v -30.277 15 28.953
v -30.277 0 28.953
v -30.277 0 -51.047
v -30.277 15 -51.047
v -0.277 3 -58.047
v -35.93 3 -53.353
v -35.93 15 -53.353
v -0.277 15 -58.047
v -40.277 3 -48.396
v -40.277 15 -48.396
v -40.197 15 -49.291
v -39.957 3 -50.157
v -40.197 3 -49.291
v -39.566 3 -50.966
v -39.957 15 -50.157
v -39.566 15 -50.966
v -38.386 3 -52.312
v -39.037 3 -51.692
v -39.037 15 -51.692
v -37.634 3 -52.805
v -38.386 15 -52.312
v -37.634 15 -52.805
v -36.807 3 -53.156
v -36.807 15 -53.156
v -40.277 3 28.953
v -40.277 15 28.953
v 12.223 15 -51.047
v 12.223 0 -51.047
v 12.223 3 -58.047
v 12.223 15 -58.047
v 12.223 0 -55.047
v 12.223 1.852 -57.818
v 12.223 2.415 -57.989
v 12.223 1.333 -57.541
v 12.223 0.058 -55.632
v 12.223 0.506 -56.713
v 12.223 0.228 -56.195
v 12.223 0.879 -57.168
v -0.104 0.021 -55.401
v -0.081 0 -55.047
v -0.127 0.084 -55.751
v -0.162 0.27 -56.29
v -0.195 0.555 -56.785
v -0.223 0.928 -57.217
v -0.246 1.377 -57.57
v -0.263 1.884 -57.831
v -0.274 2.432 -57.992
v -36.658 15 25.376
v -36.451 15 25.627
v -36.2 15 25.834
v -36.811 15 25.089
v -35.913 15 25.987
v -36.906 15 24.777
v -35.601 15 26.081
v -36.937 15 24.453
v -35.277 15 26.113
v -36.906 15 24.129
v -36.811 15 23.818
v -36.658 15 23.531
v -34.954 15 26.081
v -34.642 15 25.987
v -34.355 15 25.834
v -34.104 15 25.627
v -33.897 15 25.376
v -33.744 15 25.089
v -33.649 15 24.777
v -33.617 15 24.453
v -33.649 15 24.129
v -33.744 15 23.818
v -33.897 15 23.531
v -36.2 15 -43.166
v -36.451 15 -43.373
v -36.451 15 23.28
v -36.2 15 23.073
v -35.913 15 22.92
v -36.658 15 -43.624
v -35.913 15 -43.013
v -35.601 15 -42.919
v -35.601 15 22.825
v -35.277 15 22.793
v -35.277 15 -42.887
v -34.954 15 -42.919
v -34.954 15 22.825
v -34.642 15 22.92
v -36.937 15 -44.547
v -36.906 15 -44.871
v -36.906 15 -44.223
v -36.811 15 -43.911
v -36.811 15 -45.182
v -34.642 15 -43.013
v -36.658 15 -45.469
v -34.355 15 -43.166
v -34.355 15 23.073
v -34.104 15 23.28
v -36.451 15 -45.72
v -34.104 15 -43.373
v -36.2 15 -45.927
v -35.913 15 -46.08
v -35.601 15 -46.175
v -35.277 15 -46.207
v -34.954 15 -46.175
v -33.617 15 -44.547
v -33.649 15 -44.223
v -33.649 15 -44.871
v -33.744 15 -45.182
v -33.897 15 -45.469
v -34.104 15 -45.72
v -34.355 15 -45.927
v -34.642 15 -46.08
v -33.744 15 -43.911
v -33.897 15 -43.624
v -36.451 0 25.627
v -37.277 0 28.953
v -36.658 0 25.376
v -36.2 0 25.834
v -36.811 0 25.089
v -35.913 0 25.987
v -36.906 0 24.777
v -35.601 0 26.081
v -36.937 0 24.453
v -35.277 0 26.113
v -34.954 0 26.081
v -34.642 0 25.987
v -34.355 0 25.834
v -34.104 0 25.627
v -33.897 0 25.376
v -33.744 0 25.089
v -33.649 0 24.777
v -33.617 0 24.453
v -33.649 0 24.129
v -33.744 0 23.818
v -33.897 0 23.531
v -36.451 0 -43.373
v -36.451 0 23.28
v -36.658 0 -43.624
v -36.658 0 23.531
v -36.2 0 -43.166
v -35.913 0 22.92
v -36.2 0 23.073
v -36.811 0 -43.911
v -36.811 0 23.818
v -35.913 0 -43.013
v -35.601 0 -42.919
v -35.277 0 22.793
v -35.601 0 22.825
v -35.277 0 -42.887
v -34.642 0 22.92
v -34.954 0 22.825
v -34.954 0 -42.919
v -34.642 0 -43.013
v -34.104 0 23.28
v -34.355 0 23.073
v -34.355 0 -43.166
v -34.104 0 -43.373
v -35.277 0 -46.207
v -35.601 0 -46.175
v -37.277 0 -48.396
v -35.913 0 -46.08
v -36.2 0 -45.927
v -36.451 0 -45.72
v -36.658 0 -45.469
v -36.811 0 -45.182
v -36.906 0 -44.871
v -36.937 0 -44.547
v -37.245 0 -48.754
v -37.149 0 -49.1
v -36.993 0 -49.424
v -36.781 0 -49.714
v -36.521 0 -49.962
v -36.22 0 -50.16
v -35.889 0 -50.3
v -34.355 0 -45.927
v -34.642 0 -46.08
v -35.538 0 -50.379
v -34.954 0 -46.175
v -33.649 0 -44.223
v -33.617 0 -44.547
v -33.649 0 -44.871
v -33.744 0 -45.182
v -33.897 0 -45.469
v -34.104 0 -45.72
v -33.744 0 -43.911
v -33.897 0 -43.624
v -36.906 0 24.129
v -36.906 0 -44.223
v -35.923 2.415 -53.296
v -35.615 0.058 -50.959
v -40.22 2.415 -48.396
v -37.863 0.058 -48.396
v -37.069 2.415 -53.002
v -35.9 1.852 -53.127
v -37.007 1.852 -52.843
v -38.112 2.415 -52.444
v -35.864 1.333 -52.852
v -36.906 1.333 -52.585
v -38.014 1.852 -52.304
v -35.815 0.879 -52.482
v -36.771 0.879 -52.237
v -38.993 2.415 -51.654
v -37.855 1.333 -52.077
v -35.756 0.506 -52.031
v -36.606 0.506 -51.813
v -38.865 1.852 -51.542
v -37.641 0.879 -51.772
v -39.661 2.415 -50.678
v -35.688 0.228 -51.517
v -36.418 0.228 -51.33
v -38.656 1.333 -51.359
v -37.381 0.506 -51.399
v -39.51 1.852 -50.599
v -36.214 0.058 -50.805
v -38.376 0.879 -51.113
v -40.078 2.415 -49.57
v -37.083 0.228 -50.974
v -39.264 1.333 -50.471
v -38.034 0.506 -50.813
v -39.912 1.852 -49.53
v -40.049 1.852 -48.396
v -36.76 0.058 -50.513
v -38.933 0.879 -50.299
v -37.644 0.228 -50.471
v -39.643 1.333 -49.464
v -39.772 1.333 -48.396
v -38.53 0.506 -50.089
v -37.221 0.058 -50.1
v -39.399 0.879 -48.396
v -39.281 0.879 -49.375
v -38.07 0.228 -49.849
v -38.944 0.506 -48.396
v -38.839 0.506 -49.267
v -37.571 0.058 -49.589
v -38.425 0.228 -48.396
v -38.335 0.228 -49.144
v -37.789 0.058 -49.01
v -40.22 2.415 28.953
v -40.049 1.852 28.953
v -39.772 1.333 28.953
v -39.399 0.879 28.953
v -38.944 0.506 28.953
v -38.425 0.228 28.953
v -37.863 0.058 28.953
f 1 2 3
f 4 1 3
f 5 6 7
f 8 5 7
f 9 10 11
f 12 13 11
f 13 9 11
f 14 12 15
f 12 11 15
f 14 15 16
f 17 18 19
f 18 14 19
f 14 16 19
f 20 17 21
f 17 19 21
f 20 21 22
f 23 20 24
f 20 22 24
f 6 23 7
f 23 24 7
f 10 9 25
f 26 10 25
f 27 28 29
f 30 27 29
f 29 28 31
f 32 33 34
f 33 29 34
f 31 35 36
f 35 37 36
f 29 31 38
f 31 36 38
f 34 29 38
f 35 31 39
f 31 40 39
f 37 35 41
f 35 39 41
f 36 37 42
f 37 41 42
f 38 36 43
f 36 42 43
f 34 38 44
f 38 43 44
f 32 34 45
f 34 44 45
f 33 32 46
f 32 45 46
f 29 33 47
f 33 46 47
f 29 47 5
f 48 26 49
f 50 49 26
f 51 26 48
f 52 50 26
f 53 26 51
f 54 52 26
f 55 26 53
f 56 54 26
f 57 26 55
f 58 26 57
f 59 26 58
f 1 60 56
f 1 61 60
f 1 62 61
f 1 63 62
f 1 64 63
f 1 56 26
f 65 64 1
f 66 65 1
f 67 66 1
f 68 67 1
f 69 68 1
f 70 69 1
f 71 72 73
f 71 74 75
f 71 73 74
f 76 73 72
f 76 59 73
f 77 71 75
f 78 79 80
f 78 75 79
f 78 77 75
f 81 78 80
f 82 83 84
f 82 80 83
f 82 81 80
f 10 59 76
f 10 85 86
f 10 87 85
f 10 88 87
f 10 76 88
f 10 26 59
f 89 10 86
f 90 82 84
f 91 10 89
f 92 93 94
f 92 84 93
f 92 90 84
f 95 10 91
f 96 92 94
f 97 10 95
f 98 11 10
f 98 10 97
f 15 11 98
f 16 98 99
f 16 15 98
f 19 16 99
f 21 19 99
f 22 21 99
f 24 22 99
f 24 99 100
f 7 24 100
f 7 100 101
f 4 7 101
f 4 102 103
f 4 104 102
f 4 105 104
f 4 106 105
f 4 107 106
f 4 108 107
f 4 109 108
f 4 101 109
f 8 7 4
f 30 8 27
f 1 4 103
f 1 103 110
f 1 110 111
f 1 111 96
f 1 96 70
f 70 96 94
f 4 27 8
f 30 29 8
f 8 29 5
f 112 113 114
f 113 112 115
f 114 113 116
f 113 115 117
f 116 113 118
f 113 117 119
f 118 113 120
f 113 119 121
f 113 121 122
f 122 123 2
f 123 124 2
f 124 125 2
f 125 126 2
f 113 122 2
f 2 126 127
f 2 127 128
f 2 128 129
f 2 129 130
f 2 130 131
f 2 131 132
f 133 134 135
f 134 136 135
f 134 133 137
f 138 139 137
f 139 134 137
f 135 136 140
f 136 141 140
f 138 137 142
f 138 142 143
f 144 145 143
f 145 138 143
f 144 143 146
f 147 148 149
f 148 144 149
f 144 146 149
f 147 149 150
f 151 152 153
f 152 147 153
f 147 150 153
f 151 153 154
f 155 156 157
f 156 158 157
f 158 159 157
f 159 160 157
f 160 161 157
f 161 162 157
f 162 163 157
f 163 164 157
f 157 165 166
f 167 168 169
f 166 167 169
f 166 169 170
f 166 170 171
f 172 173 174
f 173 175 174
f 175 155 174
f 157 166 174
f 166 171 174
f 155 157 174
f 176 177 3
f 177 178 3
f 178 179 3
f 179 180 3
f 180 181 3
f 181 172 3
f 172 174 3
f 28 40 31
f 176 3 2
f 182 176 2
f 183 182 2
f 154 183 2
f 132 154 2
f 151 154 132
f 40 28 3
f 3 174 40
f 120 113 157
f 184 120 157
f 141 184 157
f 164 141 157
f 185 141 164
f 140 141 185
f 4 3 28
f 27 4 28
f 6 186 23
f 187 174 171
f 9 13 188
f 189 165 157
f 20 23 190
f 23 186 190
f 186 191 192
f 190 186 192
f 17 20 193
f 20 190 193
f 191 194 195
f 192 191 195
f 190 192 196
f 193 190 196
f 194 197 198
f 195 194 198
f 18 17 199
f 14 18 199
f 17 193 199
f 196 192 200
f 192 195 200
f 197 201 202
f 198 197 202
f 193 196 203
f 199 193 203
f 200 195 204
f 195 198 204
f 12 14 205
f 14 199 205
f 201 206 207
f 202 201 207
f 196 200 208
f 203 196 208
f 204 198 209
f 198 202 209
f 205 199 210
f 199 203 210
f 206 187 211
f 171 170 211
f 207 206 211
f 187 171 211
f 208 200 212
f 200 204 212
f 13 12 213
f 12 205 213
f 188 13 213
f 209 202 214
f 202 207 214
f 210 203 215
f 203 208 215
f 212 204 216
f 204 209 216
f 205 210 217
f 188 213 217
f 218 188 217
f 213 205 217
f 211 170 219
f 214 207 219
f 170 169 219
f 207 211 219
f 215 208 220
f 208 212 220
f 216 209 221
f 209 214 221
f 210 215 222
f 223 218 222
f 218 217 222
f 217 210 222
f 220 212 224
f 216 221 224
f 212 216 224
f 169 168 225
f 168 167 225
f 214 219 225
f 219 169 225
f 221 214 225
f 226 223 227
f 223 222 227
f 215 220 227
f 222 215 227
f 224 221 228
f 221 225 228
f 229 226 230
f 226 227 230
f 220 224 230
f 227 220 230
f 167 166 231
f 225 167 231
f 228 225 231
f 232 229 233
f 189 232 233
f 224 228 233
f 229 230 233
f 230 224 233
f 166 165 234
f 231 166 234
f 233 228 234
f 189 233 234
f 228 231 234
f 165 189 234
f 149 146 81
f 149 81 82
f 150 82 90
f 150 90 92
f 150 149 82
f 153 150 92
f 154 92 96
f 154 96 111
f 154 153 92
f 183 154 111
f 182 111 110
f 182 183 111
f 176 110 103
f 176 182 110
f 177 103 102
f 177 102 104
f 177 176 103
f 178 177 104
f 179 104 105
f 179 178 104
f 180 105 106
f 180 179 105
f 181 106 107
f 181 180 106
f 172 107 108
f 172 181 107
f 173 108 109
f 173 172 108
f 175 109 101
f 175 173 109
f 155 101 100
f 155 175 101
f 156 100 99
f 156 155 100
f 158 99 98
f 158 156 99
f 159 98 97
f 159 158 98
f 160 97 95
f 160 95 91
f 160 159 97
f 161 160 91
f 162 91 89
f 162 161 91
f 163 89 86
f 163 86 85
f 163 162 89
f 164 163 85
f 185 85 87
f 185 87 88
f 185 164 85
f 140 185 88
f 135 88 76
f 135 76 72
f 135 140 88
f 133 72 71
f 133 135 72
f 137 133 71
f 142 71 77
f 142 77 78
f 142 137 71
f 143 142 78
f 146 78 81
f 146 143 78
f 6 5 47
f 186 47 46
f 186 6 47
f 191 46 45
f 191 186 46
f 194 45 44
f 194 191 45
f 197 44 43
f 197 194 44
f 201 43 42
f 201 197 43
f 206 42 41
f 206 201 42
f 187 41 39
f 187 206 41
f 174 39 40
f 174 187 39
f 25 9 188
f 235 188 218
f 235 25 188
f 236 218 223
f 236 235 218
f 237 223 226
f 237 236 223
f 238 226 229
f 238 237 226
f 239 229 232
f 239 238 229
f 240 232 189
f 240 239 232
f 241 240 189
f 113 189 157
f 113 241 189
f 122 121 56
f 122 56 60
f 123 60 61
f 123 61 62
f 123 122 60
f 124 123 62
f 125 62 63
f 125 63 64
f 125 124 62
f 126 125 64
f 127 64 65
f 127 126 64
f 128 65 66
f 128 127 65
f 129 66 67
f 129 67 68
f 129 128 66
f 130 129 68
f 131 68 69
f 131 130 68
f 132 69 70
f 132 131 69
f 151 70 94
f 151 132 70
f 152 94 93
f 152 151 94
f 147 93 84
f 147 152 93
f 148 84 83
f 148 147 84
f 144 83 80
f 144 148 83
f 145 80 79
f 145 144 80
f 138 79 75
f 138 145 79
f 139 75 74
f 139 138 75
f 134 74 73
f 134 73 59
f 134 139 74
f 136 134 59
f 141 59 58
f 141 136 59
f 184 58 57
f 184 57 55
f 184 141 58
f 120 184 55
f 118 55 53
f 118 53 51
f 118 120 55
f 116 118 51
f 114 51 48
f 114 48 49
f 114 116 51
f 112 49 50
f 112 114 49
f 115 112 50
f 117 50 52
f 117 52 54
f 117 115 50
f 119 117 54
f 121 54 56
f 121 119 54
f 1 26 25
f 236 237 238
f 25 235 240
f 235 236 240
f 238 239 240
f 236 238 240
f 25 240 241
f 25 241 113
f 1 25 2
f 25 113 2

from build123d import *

# Parameters (mm, degrees)
SKETCH1_R           = 1.66
BOSS_EXTRUDE1_DEPTH = 15
CHAMFER1_SIZE       = 40
CHAMFER1_SIZE2      = 5.266099903
FILLET1_R           = 5
FILLET2_R           = 3


with BuildPart() as part:
    # Sketch1 → Boss-Extrude1 (new body)
    with BuildSketch(Plane(origin=(0, 0, 0), x_dir=(1, 0, 0), z_dir=(0, 1, 0))):
        Polygon((-40.27740406, 58.046693319), (-40.27740406, -28.953306681), (-30.27740406, -28.953306681), (-30.27740406, 51.046693319), (12.22259594, 51.046693319), (12.22259594, 58.046693319), align=None)
        with Locations(Location((-35.27740406, -24.453306681, 0), (0, 0, 270))):  # turned: the seam where the file's is
            Circle(SKETCH1_R, mode=Mode.SUBTRACT)
        with Locations(Location((-35.27740406, 44.546693319, 0), (0, 0, 270))):  # turned: the seam where the file's is
            Circle(SKETCH1_R, mode=Mode.SUBTRACT)
    extrude(amount=BOSS_EXTRUDE1_DEPTH)

    # Chamfer1
    chamfer1_edges = [part.edges().sort_by_distance(p)[0] for p in [
        (-40.27740406, 7.5, -58.046693319),
    ]]
    chamfer1_side = [part.faces().sort_by_distance(p)[0] for p in [
        (-14.02740406, 7.5, -58.046693319),
    ]]
    chamfer(chamfer1_edges, length=CHAMFER1_SIZE, length2=CHAMFER1_SIZE2, reference=chamfer1_side[0])

    # Fillet1
    fillet1_edges = [part.edges().sort_by_distance(p)[0] for p in [
        (-40.27740406, 7.5, -52.780593416),
    ]]
    fillet(fillet1_edges, radius=FILLET1_R)

    # Fillet2
    fillet2_edges = [part.edges().sort_by_distance(p)[0] for p in [
        (-40.27740406, 0, -9.72120221),
        (-18.10371954, 0, -55.699814363),
        (-39.036603097, 0, -51.692440176),
        (5.97259594, 0, -58.046693319),
    ]]
    fillet(fillet2_edges, radius=FILLET2_R)


solid = part.part
